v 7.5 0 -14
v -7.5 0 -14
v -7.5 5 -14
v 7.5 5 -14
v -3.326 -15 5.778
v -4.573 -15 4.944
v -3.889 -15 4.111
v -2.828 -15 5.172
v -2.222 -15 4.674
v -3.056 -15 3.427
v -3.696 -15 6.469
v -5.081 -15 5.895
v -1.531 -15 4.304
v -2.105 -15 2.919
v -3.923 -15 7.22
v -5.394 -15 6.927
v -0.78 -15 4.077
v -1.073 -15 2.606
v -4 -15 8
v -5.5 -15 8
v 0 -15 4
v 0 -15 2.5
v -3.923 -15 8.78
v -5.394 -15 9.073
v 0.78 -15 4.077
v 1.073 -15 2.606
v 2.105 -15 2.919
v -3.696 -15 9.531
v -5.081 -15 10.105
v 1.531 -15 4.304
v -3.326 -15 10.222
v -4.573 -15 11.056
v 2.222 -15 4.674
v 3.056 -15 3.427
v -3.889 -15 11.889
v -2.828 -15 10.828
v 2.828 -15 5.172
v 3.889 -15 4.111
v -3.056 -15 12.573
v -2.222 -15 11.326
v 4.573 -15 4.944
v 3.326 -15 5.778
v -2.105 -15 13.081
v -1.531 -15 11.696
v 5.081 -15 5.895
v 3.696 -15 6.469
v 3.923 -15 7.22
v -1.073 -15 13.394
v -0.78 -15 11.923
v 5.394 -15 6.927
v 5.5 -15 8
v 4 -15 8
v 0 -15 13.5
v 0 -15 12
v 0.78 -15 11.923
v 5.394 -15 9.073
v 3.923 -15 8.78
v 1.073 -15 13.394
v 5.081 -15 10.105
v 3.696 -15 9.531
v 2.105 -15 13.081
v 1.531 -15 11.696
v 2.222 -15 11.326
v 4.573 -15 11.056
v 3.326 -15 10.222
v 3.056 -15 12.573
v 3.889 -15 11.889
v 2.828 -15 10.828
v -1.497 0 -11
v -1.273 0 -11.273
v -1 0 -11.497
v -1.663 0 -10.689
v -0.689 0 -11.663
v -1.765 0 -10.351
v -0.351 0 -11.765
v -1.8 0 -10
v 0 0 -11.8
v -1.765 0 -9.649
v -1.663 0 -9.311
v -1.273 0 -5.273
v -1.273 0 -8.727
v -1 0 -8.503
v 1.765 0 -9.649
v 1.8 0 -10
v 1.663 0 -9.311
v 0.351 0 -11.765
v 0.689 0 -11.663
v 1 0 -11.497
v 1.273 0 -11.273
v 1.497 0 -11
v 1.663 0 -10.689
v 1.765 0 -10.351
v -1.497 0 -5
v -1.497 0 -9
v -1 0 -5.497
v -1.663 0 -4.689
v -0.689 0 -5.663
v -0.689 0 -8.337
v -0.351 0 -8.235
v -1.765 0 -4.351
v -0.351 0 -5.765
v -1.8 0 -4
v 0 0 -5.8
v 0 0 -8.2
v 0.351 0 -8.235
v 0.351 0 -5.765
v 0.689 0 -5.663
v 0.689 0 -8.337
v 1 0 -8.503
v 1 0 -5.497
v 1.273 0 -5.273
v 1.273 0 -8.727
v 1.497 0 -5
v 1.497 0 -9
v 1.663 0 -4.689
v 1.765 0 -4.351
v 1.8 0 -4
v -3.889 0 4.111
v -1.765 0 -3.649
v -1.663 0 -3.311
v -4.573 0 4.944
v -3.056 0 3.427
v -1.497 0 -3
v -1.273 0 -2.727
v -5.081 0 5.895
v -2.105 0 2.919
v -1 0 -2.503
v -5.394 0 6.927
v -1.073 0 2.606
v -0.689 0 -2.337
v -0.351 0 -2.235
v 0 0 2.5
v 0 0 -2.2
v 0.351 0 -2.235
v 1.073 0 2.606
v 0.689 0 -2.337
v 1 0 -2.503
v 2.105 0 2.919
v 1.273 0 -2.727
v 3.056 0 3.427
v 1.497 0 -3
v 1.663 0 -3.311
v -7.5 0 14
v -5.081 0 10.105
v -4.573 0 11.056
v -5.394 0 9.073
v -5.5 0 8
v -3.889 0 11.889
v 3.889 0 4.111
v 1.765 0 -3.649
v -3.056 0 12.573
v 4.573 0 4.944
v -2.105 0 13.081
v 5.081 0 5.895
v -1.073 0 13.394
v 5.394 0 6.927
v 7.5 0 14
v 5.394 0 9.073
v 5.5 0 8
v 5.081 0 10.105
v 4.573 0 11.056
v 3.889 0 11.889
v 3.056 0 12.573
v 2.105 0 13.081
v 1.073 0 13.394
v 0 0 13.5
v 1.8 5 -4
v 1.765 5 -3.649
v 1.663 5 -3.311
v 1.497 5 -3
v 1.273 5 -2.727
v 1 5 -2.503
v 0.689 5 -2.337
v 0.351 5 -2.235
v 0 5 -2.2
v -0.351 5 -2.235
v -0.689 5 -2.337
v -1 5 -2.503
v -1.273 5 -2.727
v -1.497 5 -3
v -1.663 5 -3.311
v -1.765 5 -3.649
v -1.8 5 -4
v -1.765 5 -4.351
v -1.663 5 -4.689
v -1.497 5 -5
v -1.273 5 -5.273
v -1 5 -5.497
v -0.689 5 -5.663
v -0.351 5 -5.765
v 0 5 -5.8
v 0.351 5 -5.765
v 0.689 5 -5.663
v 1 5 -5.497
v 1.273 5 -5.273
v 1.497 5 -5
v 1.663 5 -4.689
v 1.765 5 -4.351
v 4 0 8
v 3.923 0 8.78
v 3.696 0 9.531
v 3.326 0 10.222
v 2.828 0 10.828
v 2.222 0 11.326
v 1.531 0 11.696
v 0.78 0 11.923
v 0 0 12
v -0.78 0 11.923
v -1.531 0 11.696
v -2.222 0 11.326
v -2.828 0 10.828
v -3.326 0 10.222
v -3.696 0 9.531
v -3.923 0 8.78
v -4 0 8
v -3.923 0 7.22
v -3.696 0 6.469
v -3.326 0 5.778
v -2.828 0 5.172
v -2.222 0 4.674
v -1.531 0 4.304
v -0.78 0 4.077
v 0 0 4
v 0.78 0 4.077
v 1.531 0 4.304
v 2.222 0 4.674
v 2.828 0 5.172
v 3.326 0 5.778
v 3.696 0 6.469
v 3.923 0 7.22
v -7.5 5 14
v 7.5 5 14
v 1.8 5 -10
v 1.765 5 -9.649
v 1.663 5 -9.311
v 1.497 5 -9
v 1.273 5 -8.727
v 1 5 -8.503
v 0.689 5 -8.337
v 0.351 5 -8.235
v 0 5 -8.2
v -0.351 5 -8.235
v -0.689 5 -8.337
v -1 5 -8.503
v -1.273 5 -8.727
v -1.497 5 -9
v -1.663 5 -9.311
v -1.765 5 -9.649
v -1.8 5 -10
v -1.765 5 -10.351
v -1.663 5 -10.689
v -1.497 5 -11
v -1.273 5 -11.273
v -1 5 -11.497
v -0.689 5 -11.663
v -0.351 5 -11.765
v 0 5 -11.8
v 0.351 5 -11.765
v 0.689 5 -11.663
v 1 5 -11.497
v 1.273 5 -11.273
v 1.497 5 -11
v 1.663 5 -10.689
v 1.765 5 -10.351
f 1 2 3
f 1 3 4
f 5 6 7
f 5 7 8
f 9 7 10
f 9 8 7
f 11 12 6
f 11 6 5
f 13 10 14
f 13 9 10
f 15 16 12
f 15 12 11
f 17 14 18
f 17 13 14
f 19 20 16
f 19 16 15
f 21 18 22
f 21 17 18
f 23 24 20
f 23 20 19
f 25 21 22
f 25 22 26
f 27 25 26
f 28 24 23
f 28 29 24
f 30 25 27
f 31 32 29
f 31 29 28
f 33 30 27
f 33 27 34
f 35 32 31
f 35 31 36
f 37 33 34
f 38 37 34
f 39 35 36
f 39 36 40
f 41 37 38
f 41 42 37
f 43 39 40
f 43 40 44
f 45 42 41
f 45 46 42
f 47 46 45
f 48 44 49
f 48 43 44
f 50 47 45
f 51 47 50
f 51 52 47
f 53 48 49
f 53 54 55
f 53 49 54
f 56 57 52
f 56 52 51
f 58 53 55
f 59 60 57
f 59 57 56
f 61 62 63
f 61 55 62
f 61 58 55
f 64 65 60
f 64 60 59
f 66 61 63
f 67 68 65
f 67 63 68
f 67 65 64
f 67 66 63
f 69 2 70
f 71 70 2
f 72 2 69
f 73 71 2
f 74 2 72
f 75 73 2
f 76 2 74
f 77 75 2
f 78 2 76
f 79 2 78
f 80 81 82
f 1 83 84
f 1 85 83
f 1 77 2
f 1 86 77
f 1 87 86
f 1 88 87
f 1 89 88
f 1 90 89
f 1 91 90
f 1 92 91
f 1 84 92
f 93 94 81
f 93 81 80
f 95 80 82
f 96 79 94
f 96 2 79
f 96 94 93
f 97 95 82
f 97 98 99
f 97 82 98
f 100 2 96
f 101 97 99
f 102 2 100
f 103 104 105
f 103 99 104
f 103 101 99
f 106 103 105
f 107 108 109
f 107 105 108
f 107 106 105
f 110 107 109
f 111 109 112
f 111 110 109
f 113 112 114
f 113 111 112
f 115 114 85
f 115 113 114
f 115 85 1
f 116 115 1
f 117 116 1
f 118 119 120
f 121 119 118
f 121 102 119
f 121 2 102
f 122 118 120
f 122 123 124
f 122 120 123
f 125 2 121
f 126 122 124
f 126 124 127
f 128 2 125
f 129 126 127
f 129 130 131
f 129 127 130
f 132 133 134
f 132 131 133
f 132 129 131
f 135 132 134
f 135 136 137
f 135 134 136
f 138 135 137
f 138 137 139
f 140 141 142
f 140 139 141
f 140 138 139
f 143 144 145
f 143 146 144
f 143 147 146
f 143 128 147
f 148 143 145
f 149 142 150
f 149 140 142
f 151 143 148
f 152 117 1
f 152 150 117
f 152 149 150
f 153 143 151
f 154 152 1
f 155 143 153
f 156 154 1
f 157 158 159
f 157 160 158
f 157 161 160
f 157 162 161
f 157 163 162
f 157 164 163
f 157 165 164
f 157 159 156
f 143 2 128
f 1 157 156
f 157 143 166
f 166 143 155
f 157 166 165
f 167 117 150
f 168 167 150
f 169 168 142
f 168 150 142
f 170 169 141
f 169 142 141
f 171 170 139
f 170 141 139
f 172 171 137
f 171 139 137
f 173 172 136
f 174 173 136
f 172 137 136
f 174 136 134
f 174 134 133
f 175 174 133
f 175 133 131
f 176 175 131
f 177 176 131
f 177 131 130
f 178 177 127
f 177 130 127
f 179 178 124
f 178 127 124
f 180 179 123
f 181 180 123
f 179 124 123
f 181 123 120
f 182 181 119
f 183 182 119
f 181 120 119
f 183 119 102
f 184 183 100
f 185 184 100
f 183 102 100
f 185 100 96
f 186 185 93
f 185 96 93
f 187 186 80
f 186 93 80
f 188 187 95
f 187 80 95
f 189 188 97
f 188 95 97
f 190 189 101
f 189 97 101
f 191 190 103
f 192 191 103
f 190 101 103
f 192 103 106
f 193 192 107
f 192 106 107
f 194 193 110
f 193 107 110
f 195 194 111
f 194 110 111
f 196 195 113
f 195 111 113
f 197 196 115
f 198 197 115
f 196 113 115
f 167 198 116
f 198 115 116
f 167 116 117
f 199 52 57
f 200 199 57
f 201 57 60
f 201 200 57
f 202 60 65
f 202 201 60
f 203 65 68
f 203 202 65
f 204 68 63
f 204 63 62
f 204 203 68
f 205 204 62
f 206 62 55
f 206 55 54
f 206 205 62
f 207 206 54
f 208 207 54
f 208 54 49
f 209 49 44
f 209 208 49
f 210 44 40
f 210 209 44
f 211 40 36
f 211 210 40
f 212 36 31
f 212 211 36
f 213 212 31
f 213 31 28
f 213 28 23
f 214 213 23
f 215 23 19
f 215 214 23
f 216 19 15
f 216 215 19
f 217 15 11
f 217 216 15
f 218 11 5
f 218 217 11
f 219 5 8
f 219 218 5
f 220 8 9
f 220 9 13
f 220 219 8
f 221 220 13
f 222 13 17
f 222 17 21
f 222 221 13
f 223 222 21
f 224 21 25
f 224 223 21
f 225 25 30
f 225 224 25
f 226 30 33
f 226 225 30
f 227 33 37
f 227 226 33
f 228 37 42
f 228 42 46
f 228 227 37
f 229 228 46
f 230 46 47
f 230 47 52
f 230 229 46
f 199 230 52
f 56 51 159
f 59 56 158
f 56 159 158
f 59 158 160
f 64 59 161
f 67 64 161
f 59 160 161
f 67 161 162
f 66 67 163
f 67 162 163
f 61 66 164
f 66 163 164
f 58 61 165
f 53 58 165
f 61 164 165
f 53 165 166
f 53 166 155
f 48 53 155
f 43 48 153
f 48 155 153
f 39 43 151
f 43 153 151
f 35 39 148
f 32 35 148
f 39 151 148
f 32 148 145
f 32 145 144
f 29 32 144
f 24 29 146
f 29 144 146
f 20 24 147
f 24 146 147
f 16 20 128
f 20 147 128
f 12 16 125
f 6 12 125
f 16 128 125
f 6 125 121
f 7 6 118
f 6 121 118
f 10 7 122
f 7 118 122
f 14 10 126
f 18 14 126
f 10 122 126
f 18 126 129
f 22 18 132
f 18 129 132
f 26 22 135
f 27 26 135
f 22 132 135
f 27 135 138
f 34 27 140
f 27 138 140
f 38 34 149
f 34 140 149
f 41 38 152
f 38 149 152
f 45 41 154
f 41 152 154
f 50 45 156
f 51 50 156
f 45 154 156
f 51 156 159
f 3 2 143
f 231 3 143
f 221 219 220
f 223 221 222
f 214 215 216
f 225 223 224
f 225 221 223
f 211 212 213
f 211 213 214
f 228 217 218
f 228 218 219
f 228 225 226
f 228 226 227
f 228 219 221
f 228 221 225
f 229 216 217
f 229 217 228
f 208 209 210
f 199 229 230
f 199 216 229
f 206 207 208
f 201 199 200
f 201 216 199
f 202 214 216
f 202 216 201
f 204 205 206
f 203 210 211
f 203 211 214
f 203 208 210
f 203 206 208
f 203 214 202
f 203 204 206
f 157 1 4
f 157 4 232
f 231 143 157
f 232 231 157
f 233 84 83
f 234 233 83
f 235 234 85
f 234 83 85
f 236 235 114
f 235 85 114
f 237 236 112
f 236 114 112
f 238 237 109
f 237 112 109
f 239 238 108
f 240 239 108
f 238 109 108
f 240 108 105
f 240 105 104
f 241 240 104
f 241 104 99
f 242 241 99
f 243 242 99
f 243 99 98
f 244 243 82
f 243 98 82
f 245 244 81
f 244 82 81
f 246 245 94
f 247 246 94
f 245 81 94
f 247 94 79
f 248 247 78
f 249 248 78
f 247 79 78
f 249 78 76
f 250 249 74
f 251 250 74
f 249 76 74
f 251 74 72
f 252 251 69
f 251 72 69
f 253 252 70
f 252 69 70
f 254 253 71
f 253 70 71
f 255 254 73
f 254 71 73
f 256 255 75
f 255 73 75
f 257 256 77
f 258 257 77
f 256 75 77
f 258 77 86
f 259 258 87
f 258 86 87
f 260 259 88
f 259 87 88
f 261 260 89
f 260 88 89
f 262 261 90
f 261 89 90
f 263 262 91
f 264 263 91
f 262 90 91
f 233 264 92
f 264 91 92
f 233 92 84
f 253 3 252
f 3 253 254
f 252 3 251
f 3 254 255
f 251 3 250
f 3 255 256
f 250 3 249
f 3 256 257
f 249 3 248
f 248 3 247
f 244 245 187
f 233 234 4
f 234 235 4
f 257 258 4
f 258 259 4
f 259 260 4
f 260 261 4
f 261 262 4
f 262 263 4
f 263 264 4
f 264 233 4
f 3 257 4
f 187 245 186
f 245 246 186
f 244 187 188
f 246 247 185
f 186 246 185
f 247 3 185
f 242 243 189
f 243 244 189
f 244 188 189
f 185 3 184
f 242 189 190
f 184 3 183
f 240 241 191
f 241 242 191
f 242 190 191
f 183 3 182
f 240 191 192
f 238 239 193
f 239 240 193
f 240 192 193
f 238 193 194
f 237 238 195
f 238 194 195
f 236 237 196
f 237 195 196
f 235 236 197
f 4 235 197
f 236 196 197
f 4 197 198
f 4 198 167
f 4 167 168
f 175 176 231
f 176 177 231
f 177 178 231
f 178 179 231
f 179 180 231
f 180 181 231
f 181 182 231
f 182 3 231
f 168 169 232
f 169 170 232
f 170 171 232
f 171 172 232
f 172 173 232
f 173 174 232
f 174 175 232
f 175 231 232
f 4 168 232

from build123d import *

# Parameters (mm, degrees)
F0_W     = 15
F0_H     = 28
F0_R     = 1.8
F0_R_2   = 5.5
F0_R_3   = 4
F1_DEPTH = 5
F2_DEPTH = 15


with BuildPart() as f1:
    # F0 (on Front) → F1 (new body)
    with BuildSketch(Plane.XZ):
        Rectangle(F0_W, F0_H)
        with Locations((0, -10)):
            Circle(F0_R, mode=Mode.SUBTRACT)
        with Locations((0, -4)):
            Circle(F0_R, mode=Mode.SUBTRACT)
        with Locations((0, 8)):
            Circle(F0_R_2, mode=Mode.SUBTRACT)
        with Locations((0, 8)):
            Circle(F0_R_2)
        with Locations((0, 8)):
            Circle(F0_R_3, mode=Mode.SUBTRACT)
        with Locations((0, 8)):
            Circle(F0_R_3)
    extrude(amount=-F1_DEPTH)

    # F0 (on Front) → F2 (join)
    with BuildSketch(Plane.XZ):
        with Locations((0, 8)):
            Circle(F0_R_2)
        with Locations((0, 8)):
            Circle(F0_R_3, mode=Mode.SUBTRACT)
    extrude(amount=F2_DEPTH)


solid = f1.part
